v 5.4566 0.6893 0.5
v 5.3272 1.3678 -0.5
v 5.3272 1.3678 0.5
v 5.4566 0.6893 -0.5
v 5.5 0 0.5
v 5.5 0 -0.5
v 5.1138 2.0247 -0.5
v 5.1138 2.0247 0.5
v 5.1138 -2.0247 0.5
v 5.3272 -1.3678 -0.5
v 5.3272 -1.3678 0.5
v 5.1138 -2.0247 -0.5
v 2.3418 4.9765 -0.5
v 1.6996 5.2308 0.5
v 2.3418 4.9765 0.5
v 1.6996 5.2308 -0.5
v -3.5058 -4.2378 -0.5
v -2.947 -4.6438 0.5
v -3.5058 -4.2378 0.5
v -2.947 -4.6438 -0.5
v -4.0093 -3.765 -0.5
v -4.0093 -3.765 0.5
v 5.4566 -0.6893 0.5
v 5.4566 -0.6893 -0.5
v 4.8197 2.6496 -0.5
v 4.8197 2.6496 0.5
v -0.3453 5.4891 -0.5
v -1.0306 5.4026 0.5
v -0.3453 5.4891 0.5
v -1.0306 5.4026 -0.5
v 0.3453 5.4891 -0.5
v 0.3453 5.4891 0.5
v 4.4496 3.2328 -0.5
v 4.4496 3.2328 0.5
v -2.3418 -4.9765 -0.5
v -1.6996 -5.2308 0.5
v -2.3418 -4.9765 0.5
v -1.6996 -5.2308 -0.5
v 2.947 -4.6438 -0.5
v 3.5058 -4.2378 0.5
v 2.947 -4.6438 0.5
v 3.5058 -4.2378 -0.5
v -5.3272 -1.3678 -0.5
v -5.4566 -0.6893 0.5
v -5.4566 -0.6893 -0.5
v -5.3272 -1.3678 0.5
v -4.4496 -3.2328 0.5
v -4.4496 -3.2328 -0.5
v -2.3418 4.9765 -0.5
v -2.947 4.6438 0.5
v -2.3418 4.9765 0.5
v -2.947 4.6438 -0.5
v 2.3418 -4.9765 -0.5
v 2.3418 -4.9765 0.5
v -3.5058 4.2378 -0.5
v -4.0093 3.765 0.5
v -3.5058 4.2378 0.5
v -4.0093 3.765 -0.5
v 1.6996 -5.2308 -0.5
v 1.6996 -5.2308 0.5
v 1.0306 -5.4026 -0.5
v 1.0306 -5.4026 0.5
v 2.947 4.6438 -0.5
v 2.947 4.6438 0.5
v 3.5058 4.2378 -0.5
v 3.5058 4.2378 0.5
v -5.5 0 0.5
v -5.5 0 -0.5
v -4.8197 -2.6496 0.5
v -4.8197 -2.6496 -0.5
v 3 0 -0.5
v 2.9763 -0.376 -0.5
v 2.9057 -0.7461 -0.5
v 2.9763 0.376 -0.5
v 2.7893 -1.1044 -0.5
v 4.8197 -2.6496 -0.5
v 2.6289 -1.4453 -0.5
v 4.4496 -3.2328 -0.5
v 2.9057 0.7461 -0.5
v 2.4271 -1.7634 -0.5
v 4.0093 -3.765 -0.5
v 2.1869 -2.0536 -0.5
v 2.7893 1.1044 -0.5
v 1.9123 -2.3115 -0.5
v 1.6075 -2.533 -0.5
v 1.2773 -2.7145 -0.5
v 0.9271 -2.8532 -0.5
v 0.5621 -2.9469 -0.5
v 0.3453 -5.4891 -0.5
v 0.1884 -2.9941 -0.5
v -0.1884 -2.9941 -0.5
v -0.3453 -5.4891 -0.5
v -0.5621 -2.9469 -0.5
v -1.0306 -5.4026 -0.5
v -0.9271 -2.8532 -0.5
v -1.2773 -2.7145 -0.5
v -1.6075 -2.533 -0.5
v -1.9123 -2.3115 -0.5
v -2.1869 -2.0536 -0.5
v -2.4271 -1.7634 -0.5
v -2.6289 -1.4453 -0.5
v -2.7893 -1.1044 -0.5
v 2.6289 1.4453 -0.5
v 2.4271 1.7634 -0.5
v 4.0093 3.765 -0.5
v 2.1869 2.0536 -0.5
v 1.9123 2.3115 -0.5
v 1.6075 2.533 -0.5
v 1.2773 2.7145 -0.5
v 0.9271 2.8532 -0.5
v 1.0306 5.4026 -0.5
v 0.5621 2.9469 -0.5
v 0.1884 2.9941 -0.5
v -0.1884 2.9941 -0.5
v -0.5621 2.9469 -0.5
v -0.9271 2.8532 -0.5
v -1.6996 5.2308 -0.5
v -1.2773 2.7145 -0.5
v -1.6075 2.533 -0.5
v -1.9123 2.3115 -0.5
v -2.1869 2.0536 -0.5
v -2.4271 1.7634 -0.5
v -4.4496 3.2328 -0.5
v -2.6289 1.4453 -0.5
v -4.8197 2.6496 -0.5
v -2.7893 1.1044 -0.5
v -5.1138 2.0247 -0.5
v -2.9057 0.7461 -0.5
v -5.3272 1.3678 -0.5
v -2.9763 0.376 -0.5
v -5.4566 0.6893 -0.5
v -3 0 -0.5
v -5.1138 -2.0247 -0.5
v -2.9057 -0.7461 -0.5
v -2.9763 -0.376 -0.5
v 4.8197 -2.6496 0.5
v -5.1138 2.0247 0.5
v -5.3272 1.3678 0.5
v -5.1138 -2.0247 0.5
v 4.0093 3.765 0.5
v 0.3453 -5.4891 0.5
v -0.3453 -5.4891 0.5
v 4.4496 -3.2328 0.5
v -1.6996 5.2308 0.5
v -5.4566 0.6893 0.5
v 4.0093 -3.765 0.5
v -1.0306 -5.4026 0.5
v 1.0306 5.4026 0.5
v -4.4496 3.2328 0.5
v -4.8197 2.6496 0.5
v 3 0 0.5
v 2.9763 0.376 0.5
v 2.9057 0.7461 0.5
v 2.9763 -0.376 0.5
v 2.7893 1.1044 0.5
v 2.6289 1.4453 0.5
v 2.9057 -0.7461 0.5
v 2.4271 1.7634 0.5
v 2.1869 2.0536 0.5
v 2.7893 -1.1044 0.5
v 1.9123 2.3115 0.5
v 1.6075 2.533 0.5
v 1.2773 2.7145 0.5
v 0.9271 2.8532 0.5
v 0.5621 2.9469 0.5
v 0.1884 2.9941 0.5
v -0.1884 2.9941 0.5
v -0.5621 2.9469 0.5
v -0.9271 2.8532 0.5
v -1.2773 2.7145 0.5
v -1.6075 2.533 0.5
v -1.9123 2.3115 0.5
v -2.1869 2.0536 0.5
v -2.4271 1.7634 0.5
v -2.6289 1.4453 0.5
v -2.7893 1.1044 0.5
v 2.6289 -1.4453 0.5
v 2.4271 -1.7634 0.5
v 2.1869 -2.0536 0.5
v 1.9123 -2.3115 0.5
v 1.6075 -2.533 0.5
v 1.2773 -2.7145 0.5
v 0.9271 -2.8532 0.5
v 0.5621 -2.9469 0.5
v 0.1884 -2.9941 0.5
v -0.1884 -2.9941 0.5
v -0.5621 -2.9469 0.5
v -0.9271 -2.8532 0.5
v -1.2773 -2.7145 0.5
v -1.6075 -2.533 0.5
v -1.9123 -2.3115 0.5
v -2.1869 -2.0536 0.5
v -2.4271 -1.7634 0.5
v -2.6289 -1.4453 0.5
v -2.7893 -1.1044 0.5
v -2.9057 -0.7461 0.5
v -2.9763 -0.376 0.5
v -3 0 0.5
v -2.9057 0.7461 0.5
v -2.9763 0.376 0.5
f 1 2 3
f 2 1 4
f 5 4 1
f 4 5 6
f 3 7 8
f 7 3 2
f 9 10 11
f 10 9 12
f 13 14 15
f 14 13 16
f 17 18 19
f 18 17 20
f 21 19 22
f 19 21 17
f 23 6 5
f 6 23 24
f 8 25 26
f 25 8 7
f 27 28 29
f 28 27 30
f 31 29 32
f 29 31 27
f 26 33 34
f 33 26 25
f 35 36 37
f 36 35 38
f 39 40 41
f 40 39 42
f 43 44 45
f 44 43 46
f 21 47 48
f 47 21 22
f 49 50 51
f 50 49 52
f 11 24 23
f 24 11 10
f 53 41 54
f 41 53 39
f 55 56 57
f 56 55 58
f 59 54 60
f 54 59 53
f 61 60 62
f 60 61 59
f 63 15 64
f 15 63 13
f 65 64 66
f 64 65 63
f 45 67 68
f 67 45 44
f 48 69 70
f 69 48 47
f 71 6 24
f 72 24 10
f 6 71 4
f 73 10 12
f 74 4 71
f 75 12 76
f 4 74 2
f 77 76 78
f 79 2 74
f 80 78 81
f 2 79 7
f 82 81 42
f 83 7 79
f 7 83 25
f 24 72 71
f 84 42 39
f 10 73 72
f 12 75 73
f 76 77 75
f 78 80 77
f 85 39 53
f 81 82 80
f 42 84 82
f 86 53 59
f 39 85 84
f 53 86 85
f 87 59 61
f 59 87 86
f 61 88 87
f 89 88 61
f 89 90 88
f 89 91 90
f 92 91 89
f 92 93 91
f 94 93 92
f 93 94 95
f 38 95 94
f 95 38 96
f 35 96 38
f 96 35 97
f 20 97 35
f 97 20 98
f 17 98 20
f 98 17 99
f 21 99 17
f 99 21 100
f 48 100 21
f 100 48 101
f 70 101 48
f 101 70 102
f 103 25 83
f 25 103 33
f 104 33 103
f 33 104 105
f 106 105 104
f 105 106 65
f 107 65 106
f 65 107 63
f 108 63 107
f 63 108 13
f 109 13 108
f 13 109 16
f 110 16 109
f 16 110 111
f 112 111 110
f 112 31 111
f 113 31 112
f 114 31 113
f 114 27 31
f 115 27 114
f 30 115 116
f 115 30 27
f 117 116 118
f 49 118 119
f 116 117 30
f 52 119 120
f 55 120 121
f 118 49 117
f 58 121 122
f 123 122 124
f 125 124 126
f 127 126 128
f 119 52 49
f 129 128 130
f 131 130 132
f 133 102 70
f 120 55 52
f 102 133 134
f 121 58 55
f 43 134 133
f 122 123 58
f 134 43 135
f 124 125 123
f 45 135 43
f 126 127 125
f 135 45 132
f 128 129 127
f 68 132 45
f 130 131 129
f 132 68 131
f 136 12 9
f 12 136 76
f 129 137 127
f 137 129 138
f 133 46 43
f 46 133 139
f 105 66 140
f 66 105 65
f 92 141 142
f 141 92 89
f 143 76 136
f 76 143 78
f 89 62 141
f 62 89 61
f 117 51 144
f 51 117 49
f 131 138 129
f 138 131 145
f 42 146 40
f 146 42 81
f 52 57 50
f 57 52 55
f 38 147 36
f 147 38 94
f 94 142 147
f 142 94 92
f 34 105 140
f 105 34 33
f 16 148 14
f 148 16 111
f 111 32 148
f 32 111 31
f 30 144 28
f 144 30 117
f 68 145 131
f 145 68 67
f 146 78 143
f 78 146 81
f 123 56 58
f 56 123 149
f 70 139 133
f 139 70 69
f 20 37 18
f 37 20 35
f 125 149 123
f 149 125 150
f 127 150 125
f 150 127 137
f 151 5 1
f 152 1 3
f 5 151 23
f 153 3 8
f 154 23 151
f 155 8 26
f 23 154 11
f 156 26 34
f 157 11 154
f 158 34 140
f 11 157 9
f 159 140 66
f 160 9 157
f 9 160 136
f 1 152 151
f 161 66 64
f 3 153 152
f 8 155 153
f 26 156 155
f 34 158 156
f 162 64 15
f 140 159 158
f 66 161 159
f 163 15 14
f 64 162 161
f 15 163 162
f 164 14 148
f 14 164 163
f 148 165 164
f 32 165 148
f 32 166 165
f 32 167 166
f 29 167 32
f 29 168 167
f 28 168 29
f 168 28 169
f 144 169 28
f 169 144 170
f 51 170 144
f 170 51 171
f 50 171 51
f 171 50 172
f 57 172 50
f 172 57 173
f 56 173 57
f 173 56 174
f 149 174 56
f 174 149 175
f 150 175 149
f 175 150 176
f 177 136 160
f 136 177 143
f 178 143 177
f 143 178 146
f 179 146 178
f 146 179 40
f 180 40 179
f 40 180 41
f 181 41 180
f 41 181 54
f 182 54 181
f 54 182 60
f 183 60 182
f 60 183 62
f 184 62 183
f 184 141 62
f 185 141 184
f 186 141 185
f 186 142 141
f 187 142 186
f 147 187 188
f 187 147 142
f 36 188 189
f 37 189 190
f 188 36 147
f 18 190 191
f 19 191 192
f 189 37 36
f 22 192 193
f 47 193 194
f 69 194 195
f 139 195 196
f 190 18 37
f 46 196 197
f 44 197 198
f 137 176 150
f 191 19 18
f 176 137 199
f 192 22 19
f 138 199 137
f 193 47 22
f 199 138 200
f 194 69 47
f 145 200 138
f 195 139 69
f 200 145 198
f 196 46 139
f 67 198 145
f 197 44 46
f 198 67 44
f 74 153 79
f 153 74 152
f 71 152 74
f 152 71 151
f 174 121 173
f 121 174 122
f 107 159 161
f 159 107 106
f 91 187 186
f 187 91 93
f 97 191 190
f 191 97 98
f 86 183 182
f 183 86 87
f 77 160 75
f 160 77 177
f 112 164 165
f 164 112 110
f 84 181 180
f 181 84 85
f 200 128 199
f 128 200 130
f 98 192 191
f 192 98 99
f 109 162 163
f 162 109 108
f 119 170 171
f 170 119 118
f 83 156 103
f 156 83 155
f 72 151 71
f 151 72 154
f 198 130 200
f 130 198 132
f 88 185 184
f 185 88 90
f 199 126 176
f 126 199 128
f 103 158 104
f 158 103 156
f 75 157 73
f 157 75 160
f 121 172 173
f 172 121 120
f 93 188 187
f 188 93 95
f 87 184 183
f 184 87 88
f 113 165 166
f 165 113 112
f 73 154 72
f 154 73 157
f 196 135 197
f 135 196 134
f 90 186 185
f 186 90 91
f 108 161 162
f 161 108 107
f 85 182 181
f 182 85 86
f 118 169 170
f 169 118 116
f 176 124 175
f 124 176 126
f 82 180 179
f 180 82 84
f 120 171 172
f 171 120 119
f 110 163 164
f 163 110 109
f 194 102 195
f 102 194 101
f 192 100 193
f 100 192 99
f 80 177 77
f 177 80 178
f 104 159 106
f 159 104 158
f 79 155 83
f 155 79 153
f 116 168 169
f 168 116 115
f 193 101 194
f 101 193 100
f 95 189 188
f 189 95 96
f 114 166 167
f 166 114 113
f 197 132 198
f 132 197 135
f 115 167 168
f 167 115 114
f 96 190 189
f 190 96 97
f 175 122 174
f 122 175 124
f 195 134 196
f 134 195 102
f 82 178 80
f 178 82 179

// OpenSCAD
$fn = 50;


difference() {
	union() {
		translate(v = [0, 0, -0.5000000000]) {
			cylinder(h = 1, r = 5.5000000000);
		}
	}
	union() {
		translate(v = [0, 0, -100.0000000000]) {
			cylinder(h = 200, r = 3.0000000000);
		}
	}
}
